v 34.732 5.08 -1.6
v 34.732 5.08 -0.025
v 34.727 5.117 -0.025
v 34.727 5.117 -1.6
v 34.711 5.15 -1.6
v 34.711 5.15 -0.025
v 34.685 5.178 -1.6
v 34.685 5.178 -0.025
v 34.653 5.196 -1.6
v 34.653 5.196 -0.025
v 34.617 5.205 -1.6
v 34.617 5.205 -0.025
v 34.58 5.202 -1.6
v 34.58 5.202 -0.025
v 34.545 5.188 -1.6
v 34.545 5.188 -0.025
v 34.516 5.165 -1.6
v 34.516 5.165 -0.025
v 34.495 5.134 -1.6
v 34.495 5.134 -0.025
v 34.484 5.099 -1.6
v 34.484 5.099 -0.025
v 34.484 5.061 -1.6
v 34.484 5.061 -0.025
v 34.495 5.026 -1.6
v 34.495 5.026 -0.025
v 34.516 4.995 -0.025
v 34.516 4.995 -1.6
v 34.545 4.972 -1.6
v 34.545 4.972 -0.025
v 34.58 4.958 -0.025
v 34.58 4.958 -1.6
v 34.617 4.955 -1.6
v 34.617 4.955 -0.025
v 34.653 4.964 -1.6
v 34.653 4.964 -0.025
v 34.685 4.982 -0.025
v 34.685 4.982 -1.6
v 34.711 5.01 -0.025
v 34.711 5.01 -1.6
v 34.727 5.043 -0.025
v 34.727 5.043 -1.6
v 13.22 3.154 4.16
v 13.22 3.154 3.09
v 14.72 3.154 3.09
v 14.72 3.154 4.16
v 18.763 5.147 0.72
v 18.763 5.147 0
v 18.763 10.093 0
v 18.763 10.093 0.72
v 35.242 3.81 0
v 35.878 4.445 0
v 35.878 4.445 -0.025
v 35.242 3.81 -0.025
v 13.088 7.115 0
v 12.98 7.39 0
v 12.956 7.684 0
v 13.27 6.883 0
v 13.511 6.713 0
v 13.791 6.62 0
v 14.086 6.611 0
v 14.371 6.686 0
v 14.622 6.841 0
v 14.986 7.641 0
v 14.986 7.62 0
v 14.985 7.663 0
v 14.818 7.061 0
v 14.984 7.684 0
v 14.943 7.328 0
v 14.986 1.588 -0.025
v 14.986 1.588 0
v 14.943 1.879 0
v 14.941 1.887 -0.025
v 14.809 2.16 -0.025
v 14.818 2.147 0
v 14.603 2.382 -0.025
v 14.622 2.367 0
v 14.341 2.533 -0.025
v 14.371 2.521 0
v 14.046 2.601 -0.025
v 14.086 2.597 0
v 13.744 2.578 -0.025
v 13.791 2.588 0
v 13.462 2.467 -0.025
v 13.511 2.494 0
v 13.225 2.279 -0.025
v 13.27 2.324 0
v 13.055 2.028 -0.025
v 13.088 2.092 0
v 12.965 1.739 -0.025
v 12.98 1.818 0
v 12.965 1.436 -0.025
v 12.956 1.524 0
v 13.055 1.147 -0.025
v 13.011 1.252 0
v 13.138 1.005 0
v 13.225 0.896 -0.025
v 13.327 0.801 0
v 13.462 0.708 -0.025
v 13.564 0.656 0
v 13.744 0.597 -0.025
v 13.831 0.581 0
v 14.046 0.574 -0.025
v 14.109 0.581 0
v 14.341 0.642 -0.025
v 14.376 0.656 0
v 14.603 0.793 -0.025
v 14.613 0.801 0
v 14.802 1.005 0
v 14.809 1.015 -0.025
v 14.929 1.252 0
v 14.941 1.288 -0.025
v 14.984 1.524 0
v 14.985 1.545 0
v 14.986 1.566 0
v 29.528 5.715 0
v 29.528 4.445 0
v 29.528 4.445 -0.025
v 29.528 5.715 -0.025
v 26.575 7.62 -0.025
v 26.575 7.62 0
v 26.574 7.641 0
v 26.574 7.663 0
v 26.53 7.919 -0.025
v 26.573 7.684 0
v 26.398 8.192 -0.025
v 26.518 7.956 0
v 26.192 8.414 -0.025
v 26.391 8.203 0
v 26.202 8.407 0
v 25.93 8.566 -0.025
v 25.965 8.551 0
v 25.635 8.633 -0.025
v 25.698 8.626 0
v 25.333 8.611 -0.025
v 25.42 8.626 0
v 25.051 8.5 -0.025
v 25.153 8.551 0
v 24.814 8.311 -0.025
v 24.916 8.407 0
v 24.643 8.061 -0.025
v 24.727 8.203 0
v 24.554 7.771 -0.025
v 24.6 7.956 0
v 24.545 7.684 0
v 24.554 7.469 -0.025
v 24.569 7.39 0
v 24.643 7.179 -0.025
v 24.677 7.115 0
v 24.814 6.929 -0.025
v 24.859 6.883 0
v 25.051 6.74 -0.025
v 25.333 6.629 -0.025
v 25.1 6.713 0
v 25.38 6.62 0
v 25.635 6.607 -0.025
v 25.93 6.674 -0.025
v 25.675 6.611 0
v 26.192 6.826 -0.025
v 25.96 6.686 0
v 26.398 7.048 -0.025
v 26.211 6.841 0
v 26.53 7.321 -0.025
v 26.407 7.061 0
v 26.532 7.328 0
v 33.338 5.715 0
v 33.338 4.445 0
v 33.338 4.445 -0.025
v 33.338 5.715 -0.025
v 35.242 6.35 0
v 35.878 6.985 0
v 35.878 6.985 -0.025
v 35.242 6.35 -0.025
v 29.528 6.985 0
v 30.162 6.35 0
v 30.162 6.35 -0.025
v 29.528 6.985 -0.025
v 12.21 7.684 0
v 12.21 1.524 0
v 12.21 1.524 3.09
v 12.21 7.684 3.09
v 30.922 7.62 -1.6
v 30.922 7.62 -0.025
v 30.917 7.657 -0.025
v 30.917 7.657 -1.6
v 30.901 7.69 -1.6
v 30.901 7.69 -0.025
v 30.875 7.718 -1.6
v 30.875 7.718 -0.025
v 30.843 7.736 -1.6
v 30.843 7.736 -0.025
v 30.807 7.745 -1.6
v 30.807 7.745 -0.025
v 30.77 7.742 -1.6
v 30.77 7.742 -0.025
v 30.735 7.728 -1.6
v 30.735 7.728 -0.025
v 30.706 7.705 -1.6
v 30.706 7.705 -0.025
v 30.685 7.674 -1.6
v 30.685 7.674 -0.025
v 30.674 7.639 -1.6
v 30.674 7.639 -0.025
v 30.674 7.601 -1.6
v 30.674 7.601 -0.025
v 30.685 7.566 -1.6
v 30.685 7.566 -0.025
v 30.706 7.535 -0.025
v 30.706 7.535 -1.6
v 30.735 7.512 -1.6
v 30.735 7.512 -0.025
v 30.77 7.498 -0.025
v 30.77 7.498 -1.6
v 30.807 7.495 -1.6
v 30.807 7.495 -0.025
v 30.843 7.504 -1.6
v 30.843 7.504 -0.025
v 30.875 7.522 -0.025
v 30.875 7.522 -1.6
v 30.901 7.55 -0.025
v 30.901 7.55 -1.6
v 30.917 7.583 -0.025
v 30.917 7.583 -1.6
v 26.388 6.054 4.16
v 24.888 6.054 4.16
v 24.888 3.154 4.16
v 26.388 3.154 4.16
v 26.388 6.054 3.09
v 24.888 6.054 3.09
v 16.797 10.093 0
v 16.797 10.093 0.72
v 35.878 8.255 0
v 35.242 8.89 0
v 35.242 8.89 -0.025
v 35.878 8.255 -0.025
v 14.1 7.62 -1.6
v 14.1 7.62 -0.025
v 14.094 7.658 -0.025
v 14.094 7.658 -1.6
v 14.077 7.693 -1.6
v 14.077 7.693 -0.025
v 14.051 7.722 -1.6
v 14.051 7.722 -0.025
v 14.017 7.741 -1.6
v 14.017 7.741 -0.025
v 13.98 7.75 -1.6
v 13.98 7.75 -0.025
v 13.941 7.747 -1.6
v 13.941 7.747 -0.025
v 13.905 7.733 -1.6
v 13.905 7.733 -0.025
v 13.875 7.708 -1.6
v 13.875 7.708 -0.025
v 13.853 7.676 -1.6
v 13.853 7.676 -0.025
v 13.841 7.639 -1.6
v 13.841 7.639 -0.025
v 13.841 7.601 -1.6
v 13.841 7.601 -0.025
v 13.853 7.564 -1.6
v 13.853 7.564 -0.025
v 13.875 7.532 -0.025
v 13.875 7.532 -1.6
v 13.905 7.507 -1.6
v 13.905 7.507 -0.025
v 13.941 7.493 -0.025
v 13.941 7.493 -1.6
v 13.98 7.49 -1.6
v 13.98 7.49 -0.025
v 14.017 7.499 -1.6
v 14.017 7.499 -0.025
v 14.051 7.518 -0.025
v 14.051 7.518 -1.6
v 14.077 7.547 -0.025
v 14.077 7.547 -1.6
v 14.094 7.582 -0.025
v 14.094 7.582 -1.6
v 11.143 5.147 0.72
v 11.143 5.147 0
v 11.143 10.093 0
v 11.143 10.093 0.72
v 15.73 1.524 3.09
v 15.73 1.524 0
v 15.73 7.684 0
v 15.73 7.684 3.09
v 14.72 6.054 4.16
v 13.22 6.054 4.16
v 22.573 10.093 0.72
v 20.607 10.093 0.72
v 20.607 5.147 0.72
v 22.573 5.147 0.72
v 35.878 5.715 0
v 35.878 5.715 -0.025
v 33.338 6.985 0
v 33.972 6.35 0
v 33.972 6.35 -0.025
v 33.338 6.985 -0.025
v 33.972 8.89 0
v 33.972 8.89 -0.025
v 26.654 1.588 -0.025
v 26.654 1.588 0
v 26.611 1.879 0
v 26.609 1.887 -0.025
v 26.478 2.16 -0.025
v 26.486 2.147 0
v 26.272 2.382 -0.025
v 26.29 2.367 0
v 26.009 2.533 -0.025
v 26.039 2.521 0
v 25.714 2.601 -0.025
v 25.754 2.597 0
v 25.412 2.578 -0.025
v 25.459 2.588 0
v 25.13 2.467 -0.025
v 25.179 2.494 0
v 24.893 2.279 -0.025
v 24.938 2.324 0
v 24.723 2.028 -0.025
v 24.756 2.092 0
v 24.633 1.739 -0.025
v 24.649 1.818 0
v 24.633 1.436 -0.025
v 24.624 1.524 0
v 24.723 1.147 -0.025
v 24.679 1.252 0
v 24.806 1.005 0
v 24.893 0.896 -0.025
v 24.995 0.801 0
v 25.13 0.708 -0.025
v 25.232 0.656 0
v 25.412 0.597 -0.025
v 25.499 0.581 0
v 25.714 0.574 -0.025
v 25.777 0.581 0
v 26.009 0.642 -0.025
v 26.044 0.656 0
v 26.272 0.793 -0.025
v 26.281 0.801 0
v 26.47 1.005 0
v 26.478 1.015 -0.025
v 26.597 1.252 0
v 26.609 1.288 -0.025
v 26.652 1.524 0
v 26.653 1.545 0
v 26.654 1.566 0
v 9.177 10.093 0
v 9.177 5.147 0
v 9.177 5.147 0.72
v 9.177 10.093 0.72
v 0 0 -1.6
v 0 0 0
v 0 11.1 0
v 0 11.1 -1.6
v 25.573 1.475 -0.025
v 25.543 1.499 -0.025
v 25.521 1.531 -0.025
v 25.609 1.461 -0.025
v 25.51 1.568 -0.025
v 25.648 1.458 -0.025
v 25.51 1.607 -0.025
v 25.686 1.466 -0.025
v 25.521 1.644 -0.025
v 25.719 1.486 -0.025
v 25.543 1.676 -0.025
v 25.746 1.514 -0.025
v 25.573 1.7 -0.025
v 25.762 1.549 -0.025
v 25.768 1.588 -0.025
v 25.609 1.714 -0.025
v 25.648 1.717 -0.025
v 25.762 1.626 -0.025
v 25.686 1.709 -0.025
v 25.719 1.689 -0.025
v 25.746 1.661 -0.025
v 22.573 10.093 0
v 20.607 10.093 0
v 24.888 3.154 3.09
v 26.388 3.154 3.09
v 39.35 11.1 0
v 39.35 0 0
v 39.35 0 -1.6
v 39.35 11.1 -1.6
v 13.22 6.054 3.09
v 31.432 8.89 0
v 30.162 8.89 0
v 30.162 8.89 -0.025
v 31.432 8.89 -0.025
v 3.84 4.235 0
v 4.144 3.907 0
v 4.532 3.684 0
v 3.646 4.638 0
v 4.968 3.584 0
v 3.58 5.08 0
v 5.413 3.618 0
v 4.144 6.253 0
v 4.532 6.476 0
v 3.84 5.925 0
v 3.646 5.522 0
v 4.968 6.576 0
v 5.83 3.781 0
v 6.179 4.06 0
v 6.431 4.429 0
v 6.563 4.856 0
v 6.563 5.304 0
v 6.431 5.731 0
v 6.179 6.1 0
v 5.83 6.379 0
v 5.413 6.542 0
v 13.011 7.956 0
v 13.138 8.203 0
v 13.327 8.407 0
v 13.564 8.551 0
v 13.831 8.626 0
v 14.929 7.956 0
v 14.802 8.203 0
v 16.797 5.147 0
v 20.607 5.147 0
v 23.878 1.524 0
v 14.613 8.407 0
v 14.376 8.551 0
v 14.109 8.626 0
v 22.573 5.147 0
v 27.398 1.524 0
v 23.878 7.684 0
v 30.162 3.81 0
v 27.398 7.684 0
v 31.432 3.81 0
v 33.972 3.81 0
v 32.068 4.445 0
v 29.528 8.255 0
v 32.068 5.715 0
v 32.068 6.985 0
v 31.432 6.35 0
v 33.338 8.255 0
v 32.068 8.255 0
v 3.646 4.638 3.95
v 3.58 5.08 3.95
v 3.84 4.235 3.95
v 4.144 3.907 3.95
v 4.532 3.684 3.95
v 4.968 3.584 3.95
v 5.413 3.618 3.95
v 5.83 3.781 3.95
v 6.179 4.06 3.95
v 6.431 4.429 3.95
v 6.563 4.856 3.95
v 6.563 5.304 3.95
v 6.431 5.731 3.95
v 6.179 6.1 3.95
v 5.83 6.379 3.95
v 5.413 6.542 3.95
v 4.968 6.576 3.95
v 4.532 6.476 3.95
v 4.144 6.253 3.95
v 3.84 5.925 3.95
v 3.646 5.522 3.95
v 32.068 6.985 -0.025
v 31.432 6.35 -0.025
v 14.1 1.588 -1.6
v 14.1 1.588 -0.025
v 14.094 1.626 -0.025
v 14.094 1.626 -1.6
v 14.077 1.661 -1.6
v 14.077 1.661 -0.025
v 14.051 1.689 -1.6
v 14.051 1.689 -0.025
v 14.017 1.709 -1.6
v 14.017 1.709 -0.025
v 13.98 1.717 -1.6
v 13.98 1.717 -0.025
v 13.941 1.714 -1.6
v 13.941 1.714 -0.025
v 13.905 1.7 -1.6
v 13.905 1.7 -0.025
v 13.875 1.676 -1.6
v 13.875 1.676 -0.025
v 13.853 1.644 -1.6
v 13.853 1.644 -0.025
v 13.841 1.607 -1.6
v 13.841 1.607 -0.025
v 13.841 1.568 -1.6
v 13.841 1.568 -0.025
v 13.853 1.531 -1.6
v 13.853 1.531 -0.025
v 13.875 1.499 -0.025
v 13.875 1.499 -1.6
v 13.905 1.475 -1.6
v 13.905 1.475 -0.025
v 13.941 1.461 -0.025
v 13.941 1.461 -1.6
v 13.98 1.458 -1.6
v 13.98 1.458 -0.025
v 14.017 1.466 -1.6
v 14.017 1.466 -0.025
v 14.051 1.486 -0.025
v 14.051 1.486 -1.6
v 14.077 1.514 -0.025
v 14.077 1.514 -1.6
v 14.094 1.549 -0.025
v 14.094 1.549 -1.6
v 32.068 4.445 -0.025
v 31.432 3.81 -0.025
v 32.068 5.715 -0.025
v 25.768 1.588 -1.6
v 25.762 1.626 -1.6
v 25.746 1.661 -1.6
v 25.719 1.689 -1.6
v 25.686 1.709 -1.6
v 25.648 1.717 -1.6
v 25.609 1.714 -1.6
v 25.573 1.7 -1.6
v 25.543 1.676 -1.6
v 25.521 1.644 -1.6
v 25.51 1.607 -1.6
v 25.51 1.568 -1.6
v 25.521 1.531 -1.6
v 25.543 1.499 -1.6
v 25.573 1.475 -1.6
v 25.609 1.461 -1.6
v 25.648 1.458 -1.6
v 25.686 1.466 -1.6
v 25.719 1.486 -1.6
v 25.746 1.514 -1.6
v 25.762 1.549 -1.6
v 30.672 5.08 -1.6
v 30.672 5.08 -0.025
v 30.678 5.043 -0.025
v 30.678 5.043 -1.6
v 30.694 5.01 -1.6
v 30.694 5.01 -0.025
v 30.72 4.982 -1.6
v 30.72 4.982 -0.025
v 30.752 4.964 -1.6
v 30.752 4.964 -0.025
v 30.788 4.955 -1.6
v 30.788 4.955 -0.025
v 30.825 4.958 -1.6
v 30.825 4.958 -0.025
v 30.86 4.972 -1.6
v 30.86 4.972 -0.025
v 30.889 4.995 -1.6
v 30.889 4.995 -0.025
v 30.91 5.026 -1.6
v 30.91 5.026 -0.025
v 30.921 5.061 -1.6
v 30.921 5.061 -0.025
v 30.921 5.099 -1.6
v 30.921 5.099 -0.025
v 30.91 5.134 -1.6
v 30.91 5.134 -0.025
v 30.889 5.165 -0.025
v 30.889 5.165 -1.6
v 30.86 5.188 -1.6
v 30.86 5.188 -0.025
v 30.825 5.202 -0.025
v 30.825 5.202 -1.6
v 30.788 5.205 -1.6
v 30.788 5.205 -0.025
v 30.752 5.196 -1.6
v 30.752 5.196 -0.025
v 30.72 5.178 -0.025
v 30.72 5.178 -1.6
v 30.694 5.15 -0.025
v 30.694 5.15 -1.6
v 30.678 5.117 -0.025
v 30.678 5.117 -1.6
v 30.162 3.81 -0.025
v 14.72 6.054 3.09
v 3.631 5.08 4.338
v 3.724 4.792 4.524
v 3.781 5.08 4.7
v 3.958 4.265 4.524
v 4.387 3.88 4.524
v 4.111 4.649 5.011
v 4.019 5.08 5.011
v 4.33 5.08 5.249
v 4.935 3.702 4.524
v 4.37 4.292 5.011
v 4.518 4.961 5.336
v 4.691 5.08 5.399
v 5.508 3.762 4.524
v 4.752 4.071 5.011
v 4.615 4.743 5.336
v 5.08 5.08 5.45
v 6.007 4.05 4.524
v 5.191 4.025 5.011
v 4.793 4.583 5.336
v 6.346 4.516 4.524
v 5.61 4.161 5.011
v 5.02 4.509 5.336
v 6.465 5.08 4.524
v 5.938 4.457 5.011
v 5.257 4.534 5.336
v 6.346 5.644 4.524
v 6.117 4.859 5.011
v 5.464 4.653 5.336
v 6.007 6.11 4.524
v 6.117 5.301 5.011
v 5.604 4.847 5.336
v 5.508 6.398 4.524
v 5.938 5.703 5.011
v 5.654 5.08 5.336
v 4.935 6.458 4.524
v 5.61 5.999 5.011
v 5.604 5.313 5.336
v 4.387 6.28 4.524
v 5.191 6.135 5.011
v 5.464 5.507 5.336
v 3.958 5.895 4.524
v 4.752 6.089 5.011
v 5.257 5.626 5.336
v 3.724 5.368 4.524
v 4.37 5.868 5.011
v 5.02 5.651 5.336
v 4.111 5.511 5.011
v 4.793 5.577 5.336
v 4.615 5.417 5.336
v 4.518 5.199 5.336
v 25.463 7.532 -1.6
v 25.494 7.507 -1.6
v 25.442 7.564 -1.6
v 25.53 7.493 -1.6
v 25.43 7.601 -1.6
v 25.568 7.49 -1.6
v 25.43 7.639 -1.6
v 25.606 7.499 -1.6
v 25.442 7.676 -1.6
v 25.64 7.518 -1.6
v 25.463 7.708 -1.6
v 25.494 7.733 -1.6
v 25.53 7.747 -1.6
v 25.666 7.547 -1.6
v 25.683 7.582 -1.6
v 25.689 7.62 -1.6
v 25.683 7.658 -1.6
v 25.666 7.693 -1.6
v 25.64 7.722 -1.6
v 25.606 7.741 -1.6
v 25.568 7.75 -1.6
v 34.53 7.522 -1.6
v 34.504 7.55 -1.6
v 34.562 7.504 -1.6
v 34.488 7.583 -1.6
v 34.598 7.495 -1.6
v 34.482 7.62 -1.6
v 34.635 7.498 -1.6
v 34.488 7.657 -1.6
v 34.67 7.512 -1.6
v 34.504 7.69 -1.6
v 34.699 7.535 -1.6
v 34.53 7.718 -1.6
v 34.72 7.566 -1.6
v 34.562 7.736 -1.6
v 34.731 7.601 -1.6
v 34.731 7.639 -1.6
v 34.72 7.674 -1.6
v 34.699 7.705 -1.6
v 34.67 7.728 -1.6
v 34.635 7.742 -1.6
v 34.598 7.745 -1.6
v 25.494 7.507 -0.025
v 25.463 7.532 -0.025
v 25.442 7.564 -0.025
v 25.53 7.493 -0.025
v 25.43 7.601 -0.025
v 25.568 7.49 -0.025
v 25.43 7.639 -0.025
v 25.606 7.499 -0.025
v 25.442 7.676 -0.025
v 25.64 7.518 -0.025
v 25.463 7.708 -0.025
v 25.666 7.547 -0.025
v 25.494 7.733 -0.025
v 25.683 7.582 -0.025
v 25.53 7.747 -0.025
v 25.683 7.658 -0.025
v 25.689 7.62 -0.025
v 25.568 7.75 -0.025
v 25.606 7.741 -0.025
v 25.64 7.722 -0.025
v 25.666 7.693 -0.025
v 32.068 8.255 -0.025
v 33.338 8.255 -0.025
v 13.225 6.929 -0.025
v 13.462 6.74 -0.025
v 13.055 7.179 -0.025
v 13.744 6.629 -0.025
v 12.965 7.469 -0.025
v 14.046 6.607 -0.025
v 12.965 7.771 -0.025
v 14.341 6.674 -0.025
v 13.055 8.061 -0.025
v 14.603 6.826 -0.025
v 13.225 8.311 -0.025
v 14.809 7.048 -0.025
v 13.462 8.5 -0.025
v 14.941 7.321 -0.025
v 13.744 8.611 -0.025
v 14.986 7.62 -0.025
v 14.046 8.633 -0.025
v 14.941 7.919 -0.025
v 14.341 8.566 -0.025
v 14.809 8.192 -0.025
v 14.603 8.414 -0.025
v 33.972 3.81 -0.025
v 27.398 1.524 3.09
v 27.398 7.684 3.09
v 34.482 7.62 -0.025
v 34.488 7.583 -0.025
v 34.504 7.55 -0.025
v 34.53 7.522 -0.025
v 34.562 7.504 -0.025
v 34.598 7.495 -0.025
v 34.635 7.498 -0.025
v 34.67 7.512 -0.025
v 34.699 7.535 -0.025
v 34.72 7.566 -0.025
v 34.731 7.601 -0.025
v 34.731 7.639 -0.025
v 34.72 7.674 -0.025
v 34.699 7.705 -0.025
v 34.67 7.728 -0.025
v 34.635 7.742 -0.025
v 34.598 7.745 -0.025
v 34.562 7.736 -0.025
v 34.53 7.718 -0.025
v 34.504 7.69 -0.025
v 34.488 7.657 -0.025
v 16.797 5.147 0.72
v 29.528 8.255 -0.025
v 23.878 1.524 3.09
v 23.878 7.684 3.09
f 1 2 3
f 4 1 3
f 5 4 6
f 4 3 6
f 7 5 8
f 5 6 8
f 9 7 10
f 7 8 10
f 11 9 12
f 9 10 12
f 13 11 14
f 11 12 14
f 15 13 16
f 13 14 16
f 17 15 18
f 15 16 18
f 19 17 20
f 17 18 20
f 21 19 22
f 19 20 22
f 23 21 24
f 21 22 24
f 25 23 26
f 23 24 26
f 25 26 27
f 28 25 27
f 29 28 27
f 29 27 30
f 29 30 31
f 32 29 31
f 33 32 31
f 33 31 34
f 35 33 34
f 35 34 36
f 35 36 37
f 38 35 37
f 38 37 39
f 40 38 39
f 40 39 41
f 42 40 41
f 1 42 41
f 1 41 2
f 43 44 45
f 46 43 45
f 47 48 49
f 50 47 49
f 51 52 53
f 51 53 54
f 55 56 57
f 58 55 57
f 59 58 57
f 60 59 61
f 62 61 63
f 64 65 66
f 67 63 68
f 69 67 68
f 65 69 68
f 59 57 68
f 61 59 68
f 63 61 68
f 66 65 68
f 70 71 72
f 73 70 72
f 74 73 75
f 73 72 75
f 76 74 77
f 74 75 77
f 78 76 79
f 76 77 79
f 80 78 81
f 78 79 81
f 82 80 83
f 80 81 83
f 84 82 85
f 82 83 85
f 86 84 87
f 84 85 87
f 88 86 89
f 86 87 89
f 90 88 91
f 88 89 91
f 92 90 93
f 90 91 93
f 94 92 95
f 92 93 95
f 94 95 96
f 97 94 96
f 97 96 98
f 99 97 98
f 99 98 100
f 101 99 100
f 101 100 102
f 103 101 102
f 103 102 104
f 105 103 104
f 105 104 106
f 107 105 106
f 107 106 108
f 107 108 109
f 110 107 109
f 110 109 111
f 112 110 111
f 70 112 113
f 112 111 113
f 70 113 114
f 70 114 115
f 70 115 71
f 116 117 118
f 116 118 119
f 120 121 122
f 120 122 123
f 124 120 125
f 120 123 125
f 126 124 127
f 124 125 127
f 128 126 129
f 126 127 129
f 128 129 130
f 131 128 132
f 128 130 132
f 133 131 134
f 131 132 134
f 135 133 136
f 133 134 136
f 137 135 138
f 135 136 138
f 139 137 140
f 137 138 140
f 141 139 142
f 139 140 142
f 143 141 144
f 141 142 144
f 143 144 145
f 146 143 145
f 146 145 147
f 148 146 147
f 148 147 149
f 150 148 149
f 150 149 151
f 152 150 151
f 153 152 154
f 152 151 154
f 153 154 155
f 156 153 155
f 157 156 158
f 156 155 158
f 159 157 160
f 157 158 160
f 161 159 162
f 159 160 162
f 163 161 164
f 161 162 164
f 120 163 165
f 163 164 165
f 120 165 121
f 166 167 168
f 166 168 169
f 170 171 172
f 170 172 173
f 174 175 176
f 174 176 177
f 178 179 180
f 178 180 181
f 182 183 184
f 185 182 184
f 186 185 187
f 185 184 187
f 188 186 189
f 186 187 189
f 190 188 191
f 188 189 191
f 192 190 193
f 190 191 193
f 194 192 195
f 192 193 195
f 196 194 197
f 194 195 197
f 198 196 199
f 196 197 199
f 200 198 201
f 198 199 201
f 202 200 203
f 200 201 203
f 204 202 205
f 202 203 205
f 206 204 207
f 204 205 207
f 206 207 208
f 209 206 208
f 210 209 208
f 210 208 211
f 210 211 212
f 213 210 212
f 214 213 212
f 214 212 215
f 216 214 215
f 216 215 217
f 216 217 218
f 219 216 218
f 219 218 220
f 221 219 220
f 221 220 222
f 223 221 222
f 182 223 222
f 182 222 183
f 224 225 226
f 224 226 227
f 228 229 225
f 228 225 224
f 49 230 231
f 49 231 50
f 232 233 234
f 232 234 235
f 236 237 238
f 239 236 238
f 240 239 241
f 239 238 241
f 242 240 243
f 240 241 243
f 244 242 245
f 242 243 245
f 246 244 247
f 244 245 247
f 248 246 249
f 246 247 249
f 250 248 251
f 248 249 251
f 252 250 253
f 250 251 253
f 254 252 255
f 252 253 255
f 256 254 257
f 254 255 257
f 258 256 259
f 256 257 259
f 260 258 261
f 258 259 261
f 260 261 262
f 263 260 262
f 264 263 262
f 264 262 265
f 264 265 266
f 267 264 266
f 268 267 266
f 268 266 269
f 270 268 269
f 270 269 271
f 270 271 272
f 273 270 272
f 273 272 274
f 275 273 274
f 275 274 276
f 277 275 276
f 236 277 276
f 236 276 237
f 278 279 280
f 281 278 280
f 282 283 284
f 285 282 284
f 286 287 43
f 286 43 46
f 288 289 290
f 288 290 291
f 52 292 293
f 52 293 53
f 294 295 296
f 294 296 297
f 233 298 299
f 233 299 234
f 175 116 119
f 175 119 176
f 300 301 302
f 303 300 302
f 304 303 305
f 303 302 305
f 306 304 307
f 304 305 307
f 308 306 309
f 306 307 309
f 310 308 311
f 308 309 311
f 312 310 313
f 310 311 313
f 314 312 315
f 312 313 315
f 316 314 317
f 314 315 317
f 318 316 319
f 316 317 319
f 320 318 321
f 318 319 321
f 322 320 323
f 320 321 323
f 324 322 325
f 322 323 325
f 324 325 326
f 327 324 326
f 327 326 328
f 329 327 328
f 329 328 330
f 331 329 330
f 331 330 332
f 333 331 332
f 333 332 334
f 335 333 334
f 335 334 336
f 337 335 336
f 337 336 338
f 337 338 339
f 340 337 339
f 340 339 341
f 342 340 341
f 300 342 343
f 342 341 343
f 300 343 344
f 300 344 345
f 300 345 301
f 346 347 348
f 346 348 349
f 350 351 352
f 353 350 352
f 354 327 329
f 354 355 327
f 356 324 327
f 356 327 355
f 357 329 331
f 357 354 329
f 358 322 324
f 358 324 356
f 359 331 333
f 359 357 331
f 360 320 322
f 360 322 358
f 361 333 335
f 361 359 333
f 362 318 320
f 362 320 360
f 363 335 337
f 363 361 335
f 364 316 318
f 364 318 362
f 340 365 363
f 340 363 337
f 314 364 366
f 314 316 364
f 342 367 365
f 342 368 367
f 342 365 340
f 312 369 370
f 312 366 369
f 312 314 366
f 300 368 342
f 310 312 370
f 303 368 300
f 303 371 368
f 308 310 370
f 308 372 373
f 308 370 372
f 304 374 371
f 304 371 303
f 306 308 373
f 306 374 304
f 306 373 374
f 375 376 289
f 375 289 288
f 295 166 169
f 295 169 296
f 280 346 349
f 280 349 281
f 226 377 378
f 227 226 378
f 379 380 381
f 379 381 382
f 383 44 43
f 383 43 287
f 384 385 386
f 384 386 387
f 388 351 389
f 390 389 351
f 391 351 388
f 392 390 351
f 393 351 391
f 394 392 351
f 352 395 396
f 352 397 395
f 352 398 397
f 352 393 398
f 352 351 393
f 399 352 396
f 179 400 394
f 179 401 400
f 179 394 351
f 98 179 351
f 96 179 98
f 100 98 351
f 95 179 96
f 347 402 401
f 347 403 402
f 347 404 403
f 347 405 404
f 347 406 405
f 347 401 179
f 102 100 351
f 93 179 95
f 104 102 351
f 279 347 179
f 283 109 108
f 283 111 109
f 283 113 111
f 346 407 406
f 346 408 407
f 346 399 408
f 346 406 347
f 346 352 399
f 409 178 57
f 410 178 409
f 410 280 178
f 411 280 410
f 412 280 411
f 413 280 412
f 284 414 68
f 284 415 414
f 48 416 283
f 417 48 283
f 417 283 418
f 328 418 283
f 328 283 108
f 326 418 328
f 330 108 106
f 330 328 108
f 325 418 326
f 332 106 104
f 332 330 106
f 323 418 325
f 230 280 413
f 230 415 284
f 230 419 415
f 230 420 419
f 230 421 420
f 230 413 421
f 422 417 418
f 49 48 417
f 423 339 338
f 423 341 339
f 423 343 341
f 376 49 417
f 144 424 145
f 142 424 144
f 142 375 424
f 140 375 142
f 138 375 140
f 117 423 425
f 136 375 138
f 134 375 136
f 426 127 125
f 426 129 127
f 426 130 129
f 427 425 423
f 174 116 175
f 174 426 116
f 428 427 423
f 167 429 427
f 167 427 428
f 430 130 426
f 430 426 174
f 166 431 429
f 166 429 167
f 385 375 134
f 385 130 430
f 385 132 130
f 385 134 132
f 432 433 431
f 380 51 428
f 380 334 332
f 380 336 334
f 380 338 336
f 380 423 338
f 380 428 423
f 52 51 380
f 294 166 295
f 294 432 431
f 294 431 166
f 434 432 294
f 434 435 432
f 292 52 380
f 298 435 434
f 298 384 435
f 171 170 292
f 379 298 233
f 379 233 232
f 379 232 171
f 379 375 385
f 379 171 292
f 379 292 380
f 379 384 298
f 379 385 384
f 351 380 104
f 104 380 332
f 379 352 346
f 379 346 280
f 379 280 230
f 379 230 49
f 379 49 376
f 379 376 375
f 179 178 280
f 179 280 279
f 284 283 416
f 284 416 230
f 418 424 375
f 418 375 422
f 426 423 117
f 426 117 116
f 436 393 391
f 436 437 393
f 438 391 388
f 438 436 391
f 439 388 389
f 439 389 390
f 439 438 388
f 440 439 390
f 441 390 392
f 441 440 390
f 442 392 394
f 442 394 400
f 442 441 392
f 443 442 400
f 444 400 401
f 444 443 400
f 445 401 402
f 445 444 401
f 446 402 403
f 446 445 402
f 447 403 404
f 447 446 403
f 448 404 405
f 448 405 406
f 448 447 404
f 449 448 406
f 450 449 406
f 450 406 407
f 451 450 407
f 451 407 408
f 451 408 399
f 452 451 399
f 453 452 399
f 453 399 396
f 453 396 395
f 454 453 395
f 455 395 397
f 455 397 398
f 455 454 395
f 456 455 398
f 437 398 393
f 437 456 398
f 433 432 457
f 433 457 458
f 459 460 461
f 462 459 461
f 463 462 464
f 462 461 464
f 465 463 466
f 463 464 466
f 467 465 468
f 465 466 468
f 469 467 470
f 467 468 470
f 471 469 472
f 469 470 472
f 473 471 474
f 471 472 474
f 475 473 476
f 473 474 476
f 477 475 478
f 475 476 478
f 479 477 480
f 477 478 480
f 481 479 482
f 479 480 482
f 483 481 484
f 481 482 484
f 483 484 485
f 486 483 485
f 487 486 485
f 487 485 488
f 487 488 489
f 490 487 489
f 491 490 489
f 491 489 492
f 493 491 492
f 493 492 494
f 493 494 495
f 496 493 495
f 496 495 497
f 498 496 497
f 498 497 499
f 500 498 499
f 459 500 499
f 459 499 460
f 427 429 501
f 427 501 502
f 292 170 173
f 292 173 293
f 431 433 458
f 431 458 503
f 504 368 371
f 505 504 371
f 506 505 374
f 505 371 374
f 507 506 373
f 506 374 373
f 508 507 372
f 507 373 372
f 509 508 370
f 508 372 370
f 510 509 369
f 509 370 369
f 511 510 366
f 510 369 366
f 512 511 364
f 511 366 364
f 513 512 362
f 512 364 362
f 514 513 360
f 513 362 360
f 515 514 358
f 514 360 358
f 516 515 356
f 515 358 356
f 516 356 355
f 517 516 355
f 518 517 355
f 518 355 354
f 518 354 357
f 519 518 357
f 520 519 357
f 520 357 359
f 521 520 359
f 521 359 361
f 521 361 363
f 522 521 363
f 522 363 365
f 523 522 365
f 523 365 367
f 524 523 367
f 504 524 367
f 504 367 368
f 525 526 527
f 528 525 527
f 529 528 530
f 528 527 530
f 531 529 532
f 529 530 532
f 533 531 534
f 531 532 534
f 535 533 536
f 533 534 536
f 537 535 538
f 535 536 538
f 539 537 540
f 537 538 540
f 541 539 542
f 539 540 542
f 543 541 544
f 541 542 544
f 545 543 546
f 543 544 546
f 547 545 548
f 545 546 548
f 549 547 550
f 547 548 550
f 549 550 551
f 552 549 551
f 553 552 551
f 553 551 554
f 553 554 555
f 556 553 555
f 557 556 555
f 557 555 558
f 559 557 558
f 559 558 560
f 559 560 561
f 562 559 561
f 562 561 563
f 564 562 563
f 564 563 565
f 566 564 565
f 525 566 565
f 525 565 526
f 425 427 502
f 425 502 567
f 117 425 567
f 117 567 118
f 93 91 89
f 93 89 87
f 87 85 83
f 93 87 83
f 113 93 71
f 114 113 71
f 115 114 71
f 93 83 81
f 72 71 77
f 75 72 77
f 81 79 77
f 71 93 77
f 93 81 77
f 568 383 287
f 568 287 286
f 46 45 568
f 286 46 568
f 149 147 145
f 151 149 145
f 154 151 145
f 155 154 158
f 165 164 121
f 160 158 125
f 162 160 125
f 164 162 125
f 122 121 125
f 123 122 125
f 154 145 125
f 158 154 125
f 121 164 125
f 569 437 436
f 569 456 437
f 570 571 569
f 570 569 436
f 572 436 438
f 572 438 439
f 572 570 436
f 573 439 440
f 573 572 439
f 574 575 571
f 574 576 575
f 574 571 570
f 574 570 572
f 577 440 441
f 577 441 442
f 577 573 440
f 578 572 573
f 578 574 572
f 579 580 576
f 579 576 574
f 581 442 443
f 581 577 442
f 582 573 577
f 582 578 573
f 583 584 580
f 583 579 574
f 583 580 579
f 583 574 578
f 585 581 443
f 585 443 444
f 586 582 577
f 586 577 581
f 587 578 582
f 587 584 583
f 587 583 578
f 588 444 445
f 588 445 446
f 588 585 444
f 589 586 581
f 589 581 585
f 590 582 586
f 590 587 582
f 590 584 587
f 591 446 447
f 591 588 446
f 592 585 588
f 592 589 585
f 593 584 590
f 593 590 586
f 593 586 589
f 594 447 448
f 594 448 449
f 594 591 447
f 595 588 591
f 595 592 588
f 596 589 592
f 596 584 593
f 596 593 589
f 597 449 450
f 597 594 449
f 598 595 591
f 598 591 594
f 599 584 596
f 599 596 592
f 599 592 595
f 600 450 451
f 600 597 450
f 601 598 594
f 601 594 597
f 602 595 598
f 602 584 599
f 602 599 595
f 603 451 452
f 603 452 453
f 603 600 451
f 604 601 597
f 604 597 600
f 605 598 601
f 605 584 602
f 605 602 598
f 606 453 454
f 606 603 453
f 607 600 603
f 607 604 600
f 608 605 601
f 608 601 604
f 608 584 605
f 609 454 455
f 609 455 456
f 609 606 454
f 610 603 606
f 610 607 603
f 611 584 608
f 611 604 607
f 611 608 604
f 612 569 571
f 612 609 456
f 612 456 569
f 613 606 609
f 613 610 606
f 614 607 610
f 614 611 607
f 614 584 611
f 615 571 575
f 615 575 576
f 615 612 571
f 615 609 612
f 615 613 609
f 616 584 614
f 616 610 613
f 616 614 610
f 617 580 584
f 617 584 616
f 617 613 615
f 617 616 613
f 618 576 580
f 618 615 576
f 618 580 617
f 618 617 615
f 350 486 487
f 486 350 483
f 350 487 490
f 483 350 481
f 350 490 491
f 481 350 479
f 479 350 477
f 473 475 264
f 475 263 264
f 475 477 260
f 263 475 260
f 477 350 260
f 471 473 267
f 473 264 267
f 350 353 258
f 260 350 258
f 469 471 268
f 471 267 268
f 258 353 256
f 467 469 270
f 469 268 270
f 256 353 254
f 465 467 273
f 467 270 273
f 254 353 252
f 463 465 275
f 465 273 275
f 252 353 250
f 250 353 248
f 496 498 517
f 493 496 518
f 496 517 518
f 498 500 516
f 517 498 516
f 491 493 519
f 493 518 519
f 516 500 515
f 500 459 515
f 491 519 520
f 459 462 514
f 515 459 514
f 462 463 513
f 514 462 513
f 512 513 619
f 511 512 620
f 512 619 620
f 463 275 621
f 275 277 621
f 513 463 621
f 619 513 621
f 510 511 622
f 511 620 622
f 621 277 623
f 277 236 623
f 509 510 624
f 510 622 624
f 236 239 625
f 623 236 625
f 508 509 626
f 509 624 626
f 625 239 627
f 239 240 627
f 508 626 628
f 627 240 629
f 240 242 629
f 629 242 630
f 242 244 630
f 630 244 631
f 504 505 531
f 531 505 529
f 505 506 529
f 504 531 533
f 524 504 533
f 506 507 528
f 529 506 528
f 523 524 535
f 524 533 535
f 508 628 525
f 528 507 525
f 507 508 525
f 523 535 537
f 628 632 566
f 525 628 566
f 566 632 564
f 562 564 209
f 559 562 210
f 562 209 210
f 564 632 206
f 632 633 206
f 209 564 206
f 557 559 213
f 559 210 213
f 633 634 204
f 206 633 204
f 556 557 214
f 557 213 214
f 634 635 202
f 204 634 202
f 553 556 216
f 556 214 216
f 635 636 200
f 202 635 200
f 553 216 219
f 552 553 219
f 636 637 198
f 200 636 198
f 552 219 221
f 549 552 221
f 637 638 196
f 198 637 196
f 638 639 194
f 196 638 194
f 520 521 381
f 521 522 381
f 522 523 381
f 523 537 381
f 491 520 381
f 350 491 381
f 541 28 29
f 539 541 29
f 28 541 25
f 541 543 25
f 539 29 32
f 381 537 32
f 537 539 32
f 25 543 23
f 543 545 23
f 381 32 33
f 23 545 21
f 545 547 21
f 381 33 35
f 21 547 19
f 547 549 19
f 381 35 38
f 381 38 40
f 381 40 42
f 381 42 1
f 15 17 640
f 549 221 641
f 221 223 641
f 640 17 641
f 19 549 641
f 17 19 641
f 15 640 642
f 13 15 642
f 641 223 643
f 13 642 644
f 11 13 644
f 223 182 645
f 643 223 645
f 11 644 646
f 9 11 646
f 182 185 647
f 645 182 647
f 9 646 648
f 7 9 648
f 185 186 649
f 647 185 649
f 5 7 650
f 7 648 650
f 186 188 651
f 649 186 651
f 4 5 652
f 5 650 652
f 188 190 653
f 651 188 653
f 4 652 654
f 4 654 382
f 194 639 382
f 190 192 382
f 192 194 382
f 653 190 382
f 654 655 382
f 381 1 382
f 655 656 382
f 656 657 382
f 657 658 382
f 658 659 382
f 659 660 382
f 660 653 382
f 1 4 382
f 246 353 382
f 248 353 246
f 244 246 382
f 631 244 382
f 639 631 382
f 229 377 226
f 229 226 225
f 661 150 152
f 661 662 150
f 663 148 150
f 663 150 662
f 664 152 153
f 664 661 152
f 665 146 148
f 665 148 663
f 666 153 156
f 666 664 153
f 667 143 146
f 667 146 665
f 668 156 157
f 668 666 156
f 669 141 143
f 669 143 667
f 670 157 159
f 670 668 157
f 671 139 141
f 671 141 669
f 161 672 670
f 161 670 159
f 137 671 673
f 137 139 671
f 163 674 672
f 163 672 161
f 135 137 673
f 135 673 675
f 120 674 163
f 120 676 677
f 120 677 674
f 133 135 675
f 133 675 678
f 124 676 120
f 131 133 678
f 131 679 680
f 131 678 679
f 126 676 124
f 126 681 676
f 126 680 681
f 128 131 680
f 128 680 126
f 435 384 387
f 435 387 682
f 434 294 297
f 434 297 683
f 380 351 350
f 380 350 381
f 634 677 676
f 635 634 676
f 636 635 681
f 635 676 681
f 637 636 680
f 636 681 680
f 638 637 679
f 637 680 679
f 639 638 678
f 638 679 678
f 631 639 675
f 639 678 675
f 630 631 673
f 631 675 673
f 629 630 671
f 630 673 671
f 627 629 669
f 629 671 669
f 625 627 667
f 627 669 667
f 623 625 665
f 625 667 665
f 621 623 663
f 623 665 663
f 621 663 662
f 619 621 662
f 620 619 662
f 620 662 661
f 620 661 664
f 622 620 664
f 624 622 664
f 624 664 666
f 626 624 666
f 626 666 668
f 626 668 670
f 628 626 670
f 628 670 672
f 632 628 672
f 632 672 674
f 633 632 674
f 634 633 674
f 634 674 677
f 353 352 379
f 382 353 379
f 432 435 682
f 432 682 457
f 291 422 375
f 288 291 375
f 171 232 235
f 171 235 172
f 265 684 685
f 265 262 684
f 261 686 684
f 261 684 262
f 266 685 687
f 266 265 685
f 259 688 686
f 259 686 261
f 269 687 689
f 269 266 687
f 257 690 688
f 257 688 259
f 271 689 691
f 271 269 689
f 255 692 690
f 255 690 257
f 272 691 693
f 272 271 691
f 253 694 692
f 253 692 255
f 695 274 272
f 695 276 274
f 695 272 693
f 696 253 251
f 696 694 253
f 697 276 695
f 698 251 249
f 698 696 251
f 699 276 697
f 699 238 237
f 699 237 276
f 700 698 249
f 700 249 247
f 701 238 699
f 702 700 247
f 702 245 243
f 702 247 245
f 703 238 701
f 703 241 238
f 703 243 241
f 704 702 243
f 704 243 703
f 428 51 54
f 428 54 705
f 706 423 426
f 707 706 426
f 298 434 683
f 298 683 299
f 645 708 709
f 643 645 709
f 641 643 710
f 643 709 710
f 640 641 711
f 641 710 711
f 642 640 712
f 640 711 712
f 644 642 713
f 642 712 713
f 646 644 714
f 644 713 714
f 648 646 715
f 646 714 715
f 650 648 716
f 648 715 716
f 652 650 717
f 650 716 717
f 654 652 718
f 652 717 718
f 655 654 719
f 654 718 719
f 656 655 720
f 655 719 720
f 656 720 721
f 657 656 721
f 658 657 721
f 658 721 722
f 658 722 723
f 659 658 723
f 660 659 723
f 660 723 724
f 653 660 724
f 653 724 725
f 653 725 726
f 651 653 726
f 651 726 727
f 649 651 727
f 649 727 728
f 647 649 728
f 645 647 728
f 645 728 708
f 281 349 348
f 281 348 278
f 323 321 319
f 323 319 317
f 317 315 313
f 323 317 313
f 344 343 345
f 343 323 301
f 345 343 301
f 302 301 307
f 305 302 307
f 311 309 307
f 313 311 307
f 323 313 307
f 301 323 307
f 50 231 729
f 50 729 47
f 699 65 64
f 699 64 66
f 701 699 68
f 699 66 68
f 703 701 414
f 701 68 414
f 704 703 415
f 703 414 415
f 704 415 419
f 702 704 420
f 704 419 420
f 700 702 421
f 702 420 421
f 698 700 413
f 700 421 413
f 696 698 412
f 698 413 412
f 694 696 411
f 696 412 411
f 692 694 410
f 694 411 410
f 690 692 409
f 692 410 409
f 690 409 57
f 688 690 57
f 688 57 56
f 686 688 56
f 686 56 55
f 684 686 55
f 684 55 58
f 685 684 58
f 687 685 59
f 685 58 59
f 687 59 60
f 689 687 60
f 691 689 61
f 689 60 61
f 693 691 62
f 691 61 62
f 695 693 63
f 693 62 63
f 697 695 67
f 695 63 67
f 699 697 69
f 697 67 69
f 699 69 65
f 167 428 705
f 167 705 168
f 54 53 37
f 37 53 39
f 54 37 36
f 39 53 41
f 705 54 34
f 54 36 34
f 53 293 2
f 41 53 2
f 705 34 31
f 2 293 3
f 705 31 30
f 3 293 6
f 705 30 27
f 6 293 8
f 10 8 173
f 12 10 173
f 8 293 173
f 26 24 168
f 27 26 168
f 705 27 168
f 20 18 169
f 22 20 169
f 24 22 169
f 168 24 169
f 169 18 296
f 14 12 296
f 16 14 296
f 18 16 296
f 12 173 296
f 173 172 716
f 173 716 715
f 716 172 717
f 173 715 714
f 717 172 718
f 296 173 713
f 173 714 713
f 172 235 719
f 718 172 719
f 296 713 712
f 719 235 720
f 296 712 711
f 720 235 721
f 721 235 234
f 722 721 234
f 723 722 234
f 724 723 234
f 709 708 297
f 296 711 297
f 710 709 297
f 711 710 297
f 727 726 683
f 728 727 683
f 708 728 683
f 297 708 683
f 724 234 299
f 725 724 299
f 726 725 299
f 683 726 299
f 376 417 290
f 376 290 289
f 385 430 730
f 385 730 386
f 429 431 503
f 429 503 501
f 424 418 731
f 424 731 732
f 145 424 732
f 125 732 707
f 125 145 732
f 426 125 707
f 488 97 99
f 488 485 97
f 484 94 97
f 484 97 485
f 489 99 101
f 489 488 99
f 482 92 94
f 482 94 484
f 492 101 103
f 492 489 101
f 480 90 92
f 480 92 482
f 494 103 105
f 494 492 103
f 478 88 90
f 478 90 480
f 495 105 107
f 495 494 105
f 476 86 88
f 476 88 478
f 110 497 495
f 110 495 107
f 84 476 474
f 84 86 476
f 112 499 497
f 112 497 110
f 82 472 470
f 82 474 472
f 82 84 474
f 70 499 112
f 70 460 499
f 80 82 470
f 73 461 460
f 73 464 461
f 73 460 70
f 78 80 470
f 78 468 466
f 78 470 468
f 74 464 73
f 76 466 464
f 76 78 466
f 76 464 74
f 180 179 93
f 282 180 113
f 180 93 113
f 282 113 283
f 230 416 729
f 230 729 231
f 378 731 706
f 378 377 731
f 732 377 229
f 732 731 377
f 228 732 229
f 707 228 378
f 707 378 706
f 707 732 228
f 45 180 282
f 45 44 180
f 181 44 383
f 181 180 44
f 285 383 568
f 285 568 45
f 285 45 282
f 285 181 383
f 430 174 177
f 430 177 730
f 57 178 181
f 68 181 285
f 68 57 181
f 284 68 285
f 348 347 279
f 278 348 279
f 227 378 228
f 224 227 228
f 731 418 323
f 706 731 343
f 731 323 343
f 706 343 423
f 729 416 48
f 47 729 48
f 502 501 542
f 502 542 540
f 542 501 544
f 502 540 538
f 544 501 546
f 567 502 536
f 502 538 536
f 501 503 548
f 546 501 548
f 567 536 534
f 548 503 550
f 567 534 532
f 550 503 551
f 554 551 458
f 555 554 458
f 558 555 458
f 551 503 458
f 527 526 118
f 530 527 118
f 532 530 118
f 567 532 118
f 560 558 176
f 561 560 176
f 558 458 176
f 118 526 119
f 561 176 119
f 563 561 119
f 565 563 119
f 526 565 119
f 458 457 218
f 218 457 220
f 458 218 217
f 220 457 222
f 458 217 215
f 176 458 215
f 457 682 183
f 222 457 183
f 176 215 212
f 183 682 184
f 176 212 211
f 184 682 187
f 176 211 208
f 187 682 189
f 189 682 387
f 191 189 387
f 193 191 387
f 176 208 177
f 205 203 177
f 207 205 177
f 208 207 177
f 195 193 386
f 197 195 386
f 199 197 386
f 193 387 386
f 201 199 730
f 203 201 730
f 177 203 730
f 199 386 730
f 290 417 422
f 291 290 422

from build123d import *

# Parameters (mm, degrees)
SKETCH2_W           = 39.35
SKETCH2_H           = 11.1
BOSS_EXTRUDE1_DEPTH = 1.6
SKETCH3_W           = 1.966
SKETCH3_H           = 4.946
BOSS_EXTRUDE2_DEPTH = 0.72
SKETCH4_R           = 1.016
CUT_EXTRUDE1_DEPTH  = 0.0254
SKETCH4_3_R         = 0.13
CUT_EXTRUDE2_DEPTH  = 41.916897487
CUT_EXTRUDE3_DEPTH  = 0.0254
SKETCH6_R           = 0.125
CUT_EXTRUDE4_DEPTH  = 41.915912127
SKETCH8_W           = 3.52
SKETCH8_H           = 6.16
BOSS_EXTRUDE3_DEPTH = 3.09
SKETCH9_W           = 1.5
SKETCH9_H           = 2.9
BOSS_EXTRUDE4_DEPTH = 1.07
LPATTERN1_COUNT     = 2
LPATTERN1_PITCH     = 11.668100108


with BuildPart() as part:
    # Sketch2 → Boss-Extrude1 (new body)
    with BuildSketch(Plane.XY):
        with Locations((19.675, 5.55)):
            Rectangle(SKETCH2_W, SKETCH2_H)
    extrude(amount=-BOSS_EXTRUDE1_DEPTH)

    # Sketch3 → Boss-Extrude2 (add)
    with BuildSketch(Plane.XY):
        with Locations((10.16, 7.62)):
            Rectangle(SKETCH3_W, SKETCH3_H)
        with Locations((17.78, 7.62)):
            Rectangle(SKETCH3_W, SKETCH3_H)
        with Locations((21.59, 7.62)):
            Rectangle(SKETCH3_W, SKETCH3_H)
    extrude(amount=BOSS_EXTRUDE2_DEPTH)

    # Sketch4 → Cut-Extrude1 (cut)
    with BuildSketch(Plane.XY):
        with Locations((13.97, 1.5875)):
            Circle(SKETCH4_R)
        with Locations((13.97, 7.62)):
            Circle(SKETCH4_R)
        with Locations((25.5587, 7.62)):
            Circle(SKETCH4_R)
        with Locations((25.6381, 1.5875)):
            Circle(SKETCH4_R)
    extrude(amount=-CUT_EXTRUDE1_DEPTH, mode=Mode.SUBTRACT)

    # Sketch4<3> → Cut-Extrude2 (cut, through all)
    with BuildSketch(Plane.XY):
        with Locations((13.97, 1.5875)):
            Circle(SKETCH4_3_R)
        with Locations((13.97, 7.62)):
            Circle(SKETCH4_3_R)
        with Locations((25.5587, 7.62)):
            Circle(SKETCH4_3_R)
        with Locations((25.6381, 1.5875)):
            Circle(SKETCH4_3_R)
    extrude(amount=-CUT_EXTRUDE2_DEPTH, mode=Mode.SUBTRACT)

    # Sketch5 → Cut-Extrude3 (cut)
    with BuildSketch(Plane.XY):
        Polygon((29.5275, 6.985), (29.5275, 8.255), (30.1625, 8.89), (31.4325, 8.89), (32.0675, 8.255), (32.0675, 6.985), (31.4325, 6.35), (32.0675, 5.715), (32.0675, 4.445), (31.4325, 3.81), (30.1625, 3.81), (29.5275, 4.445), (29.5275, 5.715), (30.1625, 6.35), align=None)
        Polygon((33.3375, 4.445), (33.3375, 5.715), (33.9725, 6.35), (33.3375, 6.985), (33.3375, 8.255), (33.9725, 8.89), (35.2425, 8.89), (35.8775, 8.255), (35.8775, 6.985), (35.2425, 6.35), (35.8775, 5.715), (35.8775, 4.445), (35.2425, 3.81), (33.9725, 3.81), align=None)
    extrude(amount=-CUT_EXTRUDE3_DEPTH, mode=Mode.SUBTRACT)

    # Sketch6 → Cut-Extrude4 (cut, through all)
    with BuildSketch(Plane.XY.offset(-0.0254)):
        with Locations((30.7975, 7.62)):
            Circle(SKETCH6_R)
        with Locations((30.7975, 5.08)):
            Circle(SKETCH6_R)
        with Locations((34.6075, 5.08)):
            Circle(SKETCH6_R)
        with Locations((34.6075, 7.62)):
            Circle(SKETCH6_R)
    extrude(amount=-CUT_EXTRUDE4_DEPTH, mode=Mode.SUBTRACT)

    # Sketch8 → Boss-Extrude3 (add)
    with BuildSketch(Plane.XY):
        with Locations((13.97, 4.60375)):
            Rectangle(SKETCH8_W, SKETCH8_H)
    boss_extrude3 = extrude(amount=BOSS_EXTRUDE3_DEPTH)

    # Sketch9 → Boss-Extrude4 (add)
    with BuildSketch(Plane.XY.offset(3.09)):
        with Locations((13.97, 4.60375)):
            Rectangle(SKETCH9_W, SKETCH9_H)
    boss_extrude4 = extrude(amount=BOSS_EXTRUDE4_DEPTH)

    # LPattern1: Boss-Extrude3, Boss-Extrude4 ×2
    with Locations(*[(i * LPATTERN1_PITCH, 0, 0) for i in range(1, LPATTERN1_COUNT)]):
        add(boss_extrude3)
        add(boss_extrude4)

    # Sketch11 → Revolve18 (revolve)
    with BuildSketch(Plane.ZY.offset(-5.079644146)):
        with BuildLine():
            Line((0, 5.08), (0, 6.58))
            Line((0, 6.58), (3.95, 6.58))
            ThreePointArc((3.95, 6.58), (5.010660172, 6.140660172), (5.45, 5.08))
            Line((5.45, 5.08), (0, 5.08))
        make_face()
    revolve(axis=Axis((5.079644146, 5.08, 0), (0, 0, 1)))


solid = part.part
